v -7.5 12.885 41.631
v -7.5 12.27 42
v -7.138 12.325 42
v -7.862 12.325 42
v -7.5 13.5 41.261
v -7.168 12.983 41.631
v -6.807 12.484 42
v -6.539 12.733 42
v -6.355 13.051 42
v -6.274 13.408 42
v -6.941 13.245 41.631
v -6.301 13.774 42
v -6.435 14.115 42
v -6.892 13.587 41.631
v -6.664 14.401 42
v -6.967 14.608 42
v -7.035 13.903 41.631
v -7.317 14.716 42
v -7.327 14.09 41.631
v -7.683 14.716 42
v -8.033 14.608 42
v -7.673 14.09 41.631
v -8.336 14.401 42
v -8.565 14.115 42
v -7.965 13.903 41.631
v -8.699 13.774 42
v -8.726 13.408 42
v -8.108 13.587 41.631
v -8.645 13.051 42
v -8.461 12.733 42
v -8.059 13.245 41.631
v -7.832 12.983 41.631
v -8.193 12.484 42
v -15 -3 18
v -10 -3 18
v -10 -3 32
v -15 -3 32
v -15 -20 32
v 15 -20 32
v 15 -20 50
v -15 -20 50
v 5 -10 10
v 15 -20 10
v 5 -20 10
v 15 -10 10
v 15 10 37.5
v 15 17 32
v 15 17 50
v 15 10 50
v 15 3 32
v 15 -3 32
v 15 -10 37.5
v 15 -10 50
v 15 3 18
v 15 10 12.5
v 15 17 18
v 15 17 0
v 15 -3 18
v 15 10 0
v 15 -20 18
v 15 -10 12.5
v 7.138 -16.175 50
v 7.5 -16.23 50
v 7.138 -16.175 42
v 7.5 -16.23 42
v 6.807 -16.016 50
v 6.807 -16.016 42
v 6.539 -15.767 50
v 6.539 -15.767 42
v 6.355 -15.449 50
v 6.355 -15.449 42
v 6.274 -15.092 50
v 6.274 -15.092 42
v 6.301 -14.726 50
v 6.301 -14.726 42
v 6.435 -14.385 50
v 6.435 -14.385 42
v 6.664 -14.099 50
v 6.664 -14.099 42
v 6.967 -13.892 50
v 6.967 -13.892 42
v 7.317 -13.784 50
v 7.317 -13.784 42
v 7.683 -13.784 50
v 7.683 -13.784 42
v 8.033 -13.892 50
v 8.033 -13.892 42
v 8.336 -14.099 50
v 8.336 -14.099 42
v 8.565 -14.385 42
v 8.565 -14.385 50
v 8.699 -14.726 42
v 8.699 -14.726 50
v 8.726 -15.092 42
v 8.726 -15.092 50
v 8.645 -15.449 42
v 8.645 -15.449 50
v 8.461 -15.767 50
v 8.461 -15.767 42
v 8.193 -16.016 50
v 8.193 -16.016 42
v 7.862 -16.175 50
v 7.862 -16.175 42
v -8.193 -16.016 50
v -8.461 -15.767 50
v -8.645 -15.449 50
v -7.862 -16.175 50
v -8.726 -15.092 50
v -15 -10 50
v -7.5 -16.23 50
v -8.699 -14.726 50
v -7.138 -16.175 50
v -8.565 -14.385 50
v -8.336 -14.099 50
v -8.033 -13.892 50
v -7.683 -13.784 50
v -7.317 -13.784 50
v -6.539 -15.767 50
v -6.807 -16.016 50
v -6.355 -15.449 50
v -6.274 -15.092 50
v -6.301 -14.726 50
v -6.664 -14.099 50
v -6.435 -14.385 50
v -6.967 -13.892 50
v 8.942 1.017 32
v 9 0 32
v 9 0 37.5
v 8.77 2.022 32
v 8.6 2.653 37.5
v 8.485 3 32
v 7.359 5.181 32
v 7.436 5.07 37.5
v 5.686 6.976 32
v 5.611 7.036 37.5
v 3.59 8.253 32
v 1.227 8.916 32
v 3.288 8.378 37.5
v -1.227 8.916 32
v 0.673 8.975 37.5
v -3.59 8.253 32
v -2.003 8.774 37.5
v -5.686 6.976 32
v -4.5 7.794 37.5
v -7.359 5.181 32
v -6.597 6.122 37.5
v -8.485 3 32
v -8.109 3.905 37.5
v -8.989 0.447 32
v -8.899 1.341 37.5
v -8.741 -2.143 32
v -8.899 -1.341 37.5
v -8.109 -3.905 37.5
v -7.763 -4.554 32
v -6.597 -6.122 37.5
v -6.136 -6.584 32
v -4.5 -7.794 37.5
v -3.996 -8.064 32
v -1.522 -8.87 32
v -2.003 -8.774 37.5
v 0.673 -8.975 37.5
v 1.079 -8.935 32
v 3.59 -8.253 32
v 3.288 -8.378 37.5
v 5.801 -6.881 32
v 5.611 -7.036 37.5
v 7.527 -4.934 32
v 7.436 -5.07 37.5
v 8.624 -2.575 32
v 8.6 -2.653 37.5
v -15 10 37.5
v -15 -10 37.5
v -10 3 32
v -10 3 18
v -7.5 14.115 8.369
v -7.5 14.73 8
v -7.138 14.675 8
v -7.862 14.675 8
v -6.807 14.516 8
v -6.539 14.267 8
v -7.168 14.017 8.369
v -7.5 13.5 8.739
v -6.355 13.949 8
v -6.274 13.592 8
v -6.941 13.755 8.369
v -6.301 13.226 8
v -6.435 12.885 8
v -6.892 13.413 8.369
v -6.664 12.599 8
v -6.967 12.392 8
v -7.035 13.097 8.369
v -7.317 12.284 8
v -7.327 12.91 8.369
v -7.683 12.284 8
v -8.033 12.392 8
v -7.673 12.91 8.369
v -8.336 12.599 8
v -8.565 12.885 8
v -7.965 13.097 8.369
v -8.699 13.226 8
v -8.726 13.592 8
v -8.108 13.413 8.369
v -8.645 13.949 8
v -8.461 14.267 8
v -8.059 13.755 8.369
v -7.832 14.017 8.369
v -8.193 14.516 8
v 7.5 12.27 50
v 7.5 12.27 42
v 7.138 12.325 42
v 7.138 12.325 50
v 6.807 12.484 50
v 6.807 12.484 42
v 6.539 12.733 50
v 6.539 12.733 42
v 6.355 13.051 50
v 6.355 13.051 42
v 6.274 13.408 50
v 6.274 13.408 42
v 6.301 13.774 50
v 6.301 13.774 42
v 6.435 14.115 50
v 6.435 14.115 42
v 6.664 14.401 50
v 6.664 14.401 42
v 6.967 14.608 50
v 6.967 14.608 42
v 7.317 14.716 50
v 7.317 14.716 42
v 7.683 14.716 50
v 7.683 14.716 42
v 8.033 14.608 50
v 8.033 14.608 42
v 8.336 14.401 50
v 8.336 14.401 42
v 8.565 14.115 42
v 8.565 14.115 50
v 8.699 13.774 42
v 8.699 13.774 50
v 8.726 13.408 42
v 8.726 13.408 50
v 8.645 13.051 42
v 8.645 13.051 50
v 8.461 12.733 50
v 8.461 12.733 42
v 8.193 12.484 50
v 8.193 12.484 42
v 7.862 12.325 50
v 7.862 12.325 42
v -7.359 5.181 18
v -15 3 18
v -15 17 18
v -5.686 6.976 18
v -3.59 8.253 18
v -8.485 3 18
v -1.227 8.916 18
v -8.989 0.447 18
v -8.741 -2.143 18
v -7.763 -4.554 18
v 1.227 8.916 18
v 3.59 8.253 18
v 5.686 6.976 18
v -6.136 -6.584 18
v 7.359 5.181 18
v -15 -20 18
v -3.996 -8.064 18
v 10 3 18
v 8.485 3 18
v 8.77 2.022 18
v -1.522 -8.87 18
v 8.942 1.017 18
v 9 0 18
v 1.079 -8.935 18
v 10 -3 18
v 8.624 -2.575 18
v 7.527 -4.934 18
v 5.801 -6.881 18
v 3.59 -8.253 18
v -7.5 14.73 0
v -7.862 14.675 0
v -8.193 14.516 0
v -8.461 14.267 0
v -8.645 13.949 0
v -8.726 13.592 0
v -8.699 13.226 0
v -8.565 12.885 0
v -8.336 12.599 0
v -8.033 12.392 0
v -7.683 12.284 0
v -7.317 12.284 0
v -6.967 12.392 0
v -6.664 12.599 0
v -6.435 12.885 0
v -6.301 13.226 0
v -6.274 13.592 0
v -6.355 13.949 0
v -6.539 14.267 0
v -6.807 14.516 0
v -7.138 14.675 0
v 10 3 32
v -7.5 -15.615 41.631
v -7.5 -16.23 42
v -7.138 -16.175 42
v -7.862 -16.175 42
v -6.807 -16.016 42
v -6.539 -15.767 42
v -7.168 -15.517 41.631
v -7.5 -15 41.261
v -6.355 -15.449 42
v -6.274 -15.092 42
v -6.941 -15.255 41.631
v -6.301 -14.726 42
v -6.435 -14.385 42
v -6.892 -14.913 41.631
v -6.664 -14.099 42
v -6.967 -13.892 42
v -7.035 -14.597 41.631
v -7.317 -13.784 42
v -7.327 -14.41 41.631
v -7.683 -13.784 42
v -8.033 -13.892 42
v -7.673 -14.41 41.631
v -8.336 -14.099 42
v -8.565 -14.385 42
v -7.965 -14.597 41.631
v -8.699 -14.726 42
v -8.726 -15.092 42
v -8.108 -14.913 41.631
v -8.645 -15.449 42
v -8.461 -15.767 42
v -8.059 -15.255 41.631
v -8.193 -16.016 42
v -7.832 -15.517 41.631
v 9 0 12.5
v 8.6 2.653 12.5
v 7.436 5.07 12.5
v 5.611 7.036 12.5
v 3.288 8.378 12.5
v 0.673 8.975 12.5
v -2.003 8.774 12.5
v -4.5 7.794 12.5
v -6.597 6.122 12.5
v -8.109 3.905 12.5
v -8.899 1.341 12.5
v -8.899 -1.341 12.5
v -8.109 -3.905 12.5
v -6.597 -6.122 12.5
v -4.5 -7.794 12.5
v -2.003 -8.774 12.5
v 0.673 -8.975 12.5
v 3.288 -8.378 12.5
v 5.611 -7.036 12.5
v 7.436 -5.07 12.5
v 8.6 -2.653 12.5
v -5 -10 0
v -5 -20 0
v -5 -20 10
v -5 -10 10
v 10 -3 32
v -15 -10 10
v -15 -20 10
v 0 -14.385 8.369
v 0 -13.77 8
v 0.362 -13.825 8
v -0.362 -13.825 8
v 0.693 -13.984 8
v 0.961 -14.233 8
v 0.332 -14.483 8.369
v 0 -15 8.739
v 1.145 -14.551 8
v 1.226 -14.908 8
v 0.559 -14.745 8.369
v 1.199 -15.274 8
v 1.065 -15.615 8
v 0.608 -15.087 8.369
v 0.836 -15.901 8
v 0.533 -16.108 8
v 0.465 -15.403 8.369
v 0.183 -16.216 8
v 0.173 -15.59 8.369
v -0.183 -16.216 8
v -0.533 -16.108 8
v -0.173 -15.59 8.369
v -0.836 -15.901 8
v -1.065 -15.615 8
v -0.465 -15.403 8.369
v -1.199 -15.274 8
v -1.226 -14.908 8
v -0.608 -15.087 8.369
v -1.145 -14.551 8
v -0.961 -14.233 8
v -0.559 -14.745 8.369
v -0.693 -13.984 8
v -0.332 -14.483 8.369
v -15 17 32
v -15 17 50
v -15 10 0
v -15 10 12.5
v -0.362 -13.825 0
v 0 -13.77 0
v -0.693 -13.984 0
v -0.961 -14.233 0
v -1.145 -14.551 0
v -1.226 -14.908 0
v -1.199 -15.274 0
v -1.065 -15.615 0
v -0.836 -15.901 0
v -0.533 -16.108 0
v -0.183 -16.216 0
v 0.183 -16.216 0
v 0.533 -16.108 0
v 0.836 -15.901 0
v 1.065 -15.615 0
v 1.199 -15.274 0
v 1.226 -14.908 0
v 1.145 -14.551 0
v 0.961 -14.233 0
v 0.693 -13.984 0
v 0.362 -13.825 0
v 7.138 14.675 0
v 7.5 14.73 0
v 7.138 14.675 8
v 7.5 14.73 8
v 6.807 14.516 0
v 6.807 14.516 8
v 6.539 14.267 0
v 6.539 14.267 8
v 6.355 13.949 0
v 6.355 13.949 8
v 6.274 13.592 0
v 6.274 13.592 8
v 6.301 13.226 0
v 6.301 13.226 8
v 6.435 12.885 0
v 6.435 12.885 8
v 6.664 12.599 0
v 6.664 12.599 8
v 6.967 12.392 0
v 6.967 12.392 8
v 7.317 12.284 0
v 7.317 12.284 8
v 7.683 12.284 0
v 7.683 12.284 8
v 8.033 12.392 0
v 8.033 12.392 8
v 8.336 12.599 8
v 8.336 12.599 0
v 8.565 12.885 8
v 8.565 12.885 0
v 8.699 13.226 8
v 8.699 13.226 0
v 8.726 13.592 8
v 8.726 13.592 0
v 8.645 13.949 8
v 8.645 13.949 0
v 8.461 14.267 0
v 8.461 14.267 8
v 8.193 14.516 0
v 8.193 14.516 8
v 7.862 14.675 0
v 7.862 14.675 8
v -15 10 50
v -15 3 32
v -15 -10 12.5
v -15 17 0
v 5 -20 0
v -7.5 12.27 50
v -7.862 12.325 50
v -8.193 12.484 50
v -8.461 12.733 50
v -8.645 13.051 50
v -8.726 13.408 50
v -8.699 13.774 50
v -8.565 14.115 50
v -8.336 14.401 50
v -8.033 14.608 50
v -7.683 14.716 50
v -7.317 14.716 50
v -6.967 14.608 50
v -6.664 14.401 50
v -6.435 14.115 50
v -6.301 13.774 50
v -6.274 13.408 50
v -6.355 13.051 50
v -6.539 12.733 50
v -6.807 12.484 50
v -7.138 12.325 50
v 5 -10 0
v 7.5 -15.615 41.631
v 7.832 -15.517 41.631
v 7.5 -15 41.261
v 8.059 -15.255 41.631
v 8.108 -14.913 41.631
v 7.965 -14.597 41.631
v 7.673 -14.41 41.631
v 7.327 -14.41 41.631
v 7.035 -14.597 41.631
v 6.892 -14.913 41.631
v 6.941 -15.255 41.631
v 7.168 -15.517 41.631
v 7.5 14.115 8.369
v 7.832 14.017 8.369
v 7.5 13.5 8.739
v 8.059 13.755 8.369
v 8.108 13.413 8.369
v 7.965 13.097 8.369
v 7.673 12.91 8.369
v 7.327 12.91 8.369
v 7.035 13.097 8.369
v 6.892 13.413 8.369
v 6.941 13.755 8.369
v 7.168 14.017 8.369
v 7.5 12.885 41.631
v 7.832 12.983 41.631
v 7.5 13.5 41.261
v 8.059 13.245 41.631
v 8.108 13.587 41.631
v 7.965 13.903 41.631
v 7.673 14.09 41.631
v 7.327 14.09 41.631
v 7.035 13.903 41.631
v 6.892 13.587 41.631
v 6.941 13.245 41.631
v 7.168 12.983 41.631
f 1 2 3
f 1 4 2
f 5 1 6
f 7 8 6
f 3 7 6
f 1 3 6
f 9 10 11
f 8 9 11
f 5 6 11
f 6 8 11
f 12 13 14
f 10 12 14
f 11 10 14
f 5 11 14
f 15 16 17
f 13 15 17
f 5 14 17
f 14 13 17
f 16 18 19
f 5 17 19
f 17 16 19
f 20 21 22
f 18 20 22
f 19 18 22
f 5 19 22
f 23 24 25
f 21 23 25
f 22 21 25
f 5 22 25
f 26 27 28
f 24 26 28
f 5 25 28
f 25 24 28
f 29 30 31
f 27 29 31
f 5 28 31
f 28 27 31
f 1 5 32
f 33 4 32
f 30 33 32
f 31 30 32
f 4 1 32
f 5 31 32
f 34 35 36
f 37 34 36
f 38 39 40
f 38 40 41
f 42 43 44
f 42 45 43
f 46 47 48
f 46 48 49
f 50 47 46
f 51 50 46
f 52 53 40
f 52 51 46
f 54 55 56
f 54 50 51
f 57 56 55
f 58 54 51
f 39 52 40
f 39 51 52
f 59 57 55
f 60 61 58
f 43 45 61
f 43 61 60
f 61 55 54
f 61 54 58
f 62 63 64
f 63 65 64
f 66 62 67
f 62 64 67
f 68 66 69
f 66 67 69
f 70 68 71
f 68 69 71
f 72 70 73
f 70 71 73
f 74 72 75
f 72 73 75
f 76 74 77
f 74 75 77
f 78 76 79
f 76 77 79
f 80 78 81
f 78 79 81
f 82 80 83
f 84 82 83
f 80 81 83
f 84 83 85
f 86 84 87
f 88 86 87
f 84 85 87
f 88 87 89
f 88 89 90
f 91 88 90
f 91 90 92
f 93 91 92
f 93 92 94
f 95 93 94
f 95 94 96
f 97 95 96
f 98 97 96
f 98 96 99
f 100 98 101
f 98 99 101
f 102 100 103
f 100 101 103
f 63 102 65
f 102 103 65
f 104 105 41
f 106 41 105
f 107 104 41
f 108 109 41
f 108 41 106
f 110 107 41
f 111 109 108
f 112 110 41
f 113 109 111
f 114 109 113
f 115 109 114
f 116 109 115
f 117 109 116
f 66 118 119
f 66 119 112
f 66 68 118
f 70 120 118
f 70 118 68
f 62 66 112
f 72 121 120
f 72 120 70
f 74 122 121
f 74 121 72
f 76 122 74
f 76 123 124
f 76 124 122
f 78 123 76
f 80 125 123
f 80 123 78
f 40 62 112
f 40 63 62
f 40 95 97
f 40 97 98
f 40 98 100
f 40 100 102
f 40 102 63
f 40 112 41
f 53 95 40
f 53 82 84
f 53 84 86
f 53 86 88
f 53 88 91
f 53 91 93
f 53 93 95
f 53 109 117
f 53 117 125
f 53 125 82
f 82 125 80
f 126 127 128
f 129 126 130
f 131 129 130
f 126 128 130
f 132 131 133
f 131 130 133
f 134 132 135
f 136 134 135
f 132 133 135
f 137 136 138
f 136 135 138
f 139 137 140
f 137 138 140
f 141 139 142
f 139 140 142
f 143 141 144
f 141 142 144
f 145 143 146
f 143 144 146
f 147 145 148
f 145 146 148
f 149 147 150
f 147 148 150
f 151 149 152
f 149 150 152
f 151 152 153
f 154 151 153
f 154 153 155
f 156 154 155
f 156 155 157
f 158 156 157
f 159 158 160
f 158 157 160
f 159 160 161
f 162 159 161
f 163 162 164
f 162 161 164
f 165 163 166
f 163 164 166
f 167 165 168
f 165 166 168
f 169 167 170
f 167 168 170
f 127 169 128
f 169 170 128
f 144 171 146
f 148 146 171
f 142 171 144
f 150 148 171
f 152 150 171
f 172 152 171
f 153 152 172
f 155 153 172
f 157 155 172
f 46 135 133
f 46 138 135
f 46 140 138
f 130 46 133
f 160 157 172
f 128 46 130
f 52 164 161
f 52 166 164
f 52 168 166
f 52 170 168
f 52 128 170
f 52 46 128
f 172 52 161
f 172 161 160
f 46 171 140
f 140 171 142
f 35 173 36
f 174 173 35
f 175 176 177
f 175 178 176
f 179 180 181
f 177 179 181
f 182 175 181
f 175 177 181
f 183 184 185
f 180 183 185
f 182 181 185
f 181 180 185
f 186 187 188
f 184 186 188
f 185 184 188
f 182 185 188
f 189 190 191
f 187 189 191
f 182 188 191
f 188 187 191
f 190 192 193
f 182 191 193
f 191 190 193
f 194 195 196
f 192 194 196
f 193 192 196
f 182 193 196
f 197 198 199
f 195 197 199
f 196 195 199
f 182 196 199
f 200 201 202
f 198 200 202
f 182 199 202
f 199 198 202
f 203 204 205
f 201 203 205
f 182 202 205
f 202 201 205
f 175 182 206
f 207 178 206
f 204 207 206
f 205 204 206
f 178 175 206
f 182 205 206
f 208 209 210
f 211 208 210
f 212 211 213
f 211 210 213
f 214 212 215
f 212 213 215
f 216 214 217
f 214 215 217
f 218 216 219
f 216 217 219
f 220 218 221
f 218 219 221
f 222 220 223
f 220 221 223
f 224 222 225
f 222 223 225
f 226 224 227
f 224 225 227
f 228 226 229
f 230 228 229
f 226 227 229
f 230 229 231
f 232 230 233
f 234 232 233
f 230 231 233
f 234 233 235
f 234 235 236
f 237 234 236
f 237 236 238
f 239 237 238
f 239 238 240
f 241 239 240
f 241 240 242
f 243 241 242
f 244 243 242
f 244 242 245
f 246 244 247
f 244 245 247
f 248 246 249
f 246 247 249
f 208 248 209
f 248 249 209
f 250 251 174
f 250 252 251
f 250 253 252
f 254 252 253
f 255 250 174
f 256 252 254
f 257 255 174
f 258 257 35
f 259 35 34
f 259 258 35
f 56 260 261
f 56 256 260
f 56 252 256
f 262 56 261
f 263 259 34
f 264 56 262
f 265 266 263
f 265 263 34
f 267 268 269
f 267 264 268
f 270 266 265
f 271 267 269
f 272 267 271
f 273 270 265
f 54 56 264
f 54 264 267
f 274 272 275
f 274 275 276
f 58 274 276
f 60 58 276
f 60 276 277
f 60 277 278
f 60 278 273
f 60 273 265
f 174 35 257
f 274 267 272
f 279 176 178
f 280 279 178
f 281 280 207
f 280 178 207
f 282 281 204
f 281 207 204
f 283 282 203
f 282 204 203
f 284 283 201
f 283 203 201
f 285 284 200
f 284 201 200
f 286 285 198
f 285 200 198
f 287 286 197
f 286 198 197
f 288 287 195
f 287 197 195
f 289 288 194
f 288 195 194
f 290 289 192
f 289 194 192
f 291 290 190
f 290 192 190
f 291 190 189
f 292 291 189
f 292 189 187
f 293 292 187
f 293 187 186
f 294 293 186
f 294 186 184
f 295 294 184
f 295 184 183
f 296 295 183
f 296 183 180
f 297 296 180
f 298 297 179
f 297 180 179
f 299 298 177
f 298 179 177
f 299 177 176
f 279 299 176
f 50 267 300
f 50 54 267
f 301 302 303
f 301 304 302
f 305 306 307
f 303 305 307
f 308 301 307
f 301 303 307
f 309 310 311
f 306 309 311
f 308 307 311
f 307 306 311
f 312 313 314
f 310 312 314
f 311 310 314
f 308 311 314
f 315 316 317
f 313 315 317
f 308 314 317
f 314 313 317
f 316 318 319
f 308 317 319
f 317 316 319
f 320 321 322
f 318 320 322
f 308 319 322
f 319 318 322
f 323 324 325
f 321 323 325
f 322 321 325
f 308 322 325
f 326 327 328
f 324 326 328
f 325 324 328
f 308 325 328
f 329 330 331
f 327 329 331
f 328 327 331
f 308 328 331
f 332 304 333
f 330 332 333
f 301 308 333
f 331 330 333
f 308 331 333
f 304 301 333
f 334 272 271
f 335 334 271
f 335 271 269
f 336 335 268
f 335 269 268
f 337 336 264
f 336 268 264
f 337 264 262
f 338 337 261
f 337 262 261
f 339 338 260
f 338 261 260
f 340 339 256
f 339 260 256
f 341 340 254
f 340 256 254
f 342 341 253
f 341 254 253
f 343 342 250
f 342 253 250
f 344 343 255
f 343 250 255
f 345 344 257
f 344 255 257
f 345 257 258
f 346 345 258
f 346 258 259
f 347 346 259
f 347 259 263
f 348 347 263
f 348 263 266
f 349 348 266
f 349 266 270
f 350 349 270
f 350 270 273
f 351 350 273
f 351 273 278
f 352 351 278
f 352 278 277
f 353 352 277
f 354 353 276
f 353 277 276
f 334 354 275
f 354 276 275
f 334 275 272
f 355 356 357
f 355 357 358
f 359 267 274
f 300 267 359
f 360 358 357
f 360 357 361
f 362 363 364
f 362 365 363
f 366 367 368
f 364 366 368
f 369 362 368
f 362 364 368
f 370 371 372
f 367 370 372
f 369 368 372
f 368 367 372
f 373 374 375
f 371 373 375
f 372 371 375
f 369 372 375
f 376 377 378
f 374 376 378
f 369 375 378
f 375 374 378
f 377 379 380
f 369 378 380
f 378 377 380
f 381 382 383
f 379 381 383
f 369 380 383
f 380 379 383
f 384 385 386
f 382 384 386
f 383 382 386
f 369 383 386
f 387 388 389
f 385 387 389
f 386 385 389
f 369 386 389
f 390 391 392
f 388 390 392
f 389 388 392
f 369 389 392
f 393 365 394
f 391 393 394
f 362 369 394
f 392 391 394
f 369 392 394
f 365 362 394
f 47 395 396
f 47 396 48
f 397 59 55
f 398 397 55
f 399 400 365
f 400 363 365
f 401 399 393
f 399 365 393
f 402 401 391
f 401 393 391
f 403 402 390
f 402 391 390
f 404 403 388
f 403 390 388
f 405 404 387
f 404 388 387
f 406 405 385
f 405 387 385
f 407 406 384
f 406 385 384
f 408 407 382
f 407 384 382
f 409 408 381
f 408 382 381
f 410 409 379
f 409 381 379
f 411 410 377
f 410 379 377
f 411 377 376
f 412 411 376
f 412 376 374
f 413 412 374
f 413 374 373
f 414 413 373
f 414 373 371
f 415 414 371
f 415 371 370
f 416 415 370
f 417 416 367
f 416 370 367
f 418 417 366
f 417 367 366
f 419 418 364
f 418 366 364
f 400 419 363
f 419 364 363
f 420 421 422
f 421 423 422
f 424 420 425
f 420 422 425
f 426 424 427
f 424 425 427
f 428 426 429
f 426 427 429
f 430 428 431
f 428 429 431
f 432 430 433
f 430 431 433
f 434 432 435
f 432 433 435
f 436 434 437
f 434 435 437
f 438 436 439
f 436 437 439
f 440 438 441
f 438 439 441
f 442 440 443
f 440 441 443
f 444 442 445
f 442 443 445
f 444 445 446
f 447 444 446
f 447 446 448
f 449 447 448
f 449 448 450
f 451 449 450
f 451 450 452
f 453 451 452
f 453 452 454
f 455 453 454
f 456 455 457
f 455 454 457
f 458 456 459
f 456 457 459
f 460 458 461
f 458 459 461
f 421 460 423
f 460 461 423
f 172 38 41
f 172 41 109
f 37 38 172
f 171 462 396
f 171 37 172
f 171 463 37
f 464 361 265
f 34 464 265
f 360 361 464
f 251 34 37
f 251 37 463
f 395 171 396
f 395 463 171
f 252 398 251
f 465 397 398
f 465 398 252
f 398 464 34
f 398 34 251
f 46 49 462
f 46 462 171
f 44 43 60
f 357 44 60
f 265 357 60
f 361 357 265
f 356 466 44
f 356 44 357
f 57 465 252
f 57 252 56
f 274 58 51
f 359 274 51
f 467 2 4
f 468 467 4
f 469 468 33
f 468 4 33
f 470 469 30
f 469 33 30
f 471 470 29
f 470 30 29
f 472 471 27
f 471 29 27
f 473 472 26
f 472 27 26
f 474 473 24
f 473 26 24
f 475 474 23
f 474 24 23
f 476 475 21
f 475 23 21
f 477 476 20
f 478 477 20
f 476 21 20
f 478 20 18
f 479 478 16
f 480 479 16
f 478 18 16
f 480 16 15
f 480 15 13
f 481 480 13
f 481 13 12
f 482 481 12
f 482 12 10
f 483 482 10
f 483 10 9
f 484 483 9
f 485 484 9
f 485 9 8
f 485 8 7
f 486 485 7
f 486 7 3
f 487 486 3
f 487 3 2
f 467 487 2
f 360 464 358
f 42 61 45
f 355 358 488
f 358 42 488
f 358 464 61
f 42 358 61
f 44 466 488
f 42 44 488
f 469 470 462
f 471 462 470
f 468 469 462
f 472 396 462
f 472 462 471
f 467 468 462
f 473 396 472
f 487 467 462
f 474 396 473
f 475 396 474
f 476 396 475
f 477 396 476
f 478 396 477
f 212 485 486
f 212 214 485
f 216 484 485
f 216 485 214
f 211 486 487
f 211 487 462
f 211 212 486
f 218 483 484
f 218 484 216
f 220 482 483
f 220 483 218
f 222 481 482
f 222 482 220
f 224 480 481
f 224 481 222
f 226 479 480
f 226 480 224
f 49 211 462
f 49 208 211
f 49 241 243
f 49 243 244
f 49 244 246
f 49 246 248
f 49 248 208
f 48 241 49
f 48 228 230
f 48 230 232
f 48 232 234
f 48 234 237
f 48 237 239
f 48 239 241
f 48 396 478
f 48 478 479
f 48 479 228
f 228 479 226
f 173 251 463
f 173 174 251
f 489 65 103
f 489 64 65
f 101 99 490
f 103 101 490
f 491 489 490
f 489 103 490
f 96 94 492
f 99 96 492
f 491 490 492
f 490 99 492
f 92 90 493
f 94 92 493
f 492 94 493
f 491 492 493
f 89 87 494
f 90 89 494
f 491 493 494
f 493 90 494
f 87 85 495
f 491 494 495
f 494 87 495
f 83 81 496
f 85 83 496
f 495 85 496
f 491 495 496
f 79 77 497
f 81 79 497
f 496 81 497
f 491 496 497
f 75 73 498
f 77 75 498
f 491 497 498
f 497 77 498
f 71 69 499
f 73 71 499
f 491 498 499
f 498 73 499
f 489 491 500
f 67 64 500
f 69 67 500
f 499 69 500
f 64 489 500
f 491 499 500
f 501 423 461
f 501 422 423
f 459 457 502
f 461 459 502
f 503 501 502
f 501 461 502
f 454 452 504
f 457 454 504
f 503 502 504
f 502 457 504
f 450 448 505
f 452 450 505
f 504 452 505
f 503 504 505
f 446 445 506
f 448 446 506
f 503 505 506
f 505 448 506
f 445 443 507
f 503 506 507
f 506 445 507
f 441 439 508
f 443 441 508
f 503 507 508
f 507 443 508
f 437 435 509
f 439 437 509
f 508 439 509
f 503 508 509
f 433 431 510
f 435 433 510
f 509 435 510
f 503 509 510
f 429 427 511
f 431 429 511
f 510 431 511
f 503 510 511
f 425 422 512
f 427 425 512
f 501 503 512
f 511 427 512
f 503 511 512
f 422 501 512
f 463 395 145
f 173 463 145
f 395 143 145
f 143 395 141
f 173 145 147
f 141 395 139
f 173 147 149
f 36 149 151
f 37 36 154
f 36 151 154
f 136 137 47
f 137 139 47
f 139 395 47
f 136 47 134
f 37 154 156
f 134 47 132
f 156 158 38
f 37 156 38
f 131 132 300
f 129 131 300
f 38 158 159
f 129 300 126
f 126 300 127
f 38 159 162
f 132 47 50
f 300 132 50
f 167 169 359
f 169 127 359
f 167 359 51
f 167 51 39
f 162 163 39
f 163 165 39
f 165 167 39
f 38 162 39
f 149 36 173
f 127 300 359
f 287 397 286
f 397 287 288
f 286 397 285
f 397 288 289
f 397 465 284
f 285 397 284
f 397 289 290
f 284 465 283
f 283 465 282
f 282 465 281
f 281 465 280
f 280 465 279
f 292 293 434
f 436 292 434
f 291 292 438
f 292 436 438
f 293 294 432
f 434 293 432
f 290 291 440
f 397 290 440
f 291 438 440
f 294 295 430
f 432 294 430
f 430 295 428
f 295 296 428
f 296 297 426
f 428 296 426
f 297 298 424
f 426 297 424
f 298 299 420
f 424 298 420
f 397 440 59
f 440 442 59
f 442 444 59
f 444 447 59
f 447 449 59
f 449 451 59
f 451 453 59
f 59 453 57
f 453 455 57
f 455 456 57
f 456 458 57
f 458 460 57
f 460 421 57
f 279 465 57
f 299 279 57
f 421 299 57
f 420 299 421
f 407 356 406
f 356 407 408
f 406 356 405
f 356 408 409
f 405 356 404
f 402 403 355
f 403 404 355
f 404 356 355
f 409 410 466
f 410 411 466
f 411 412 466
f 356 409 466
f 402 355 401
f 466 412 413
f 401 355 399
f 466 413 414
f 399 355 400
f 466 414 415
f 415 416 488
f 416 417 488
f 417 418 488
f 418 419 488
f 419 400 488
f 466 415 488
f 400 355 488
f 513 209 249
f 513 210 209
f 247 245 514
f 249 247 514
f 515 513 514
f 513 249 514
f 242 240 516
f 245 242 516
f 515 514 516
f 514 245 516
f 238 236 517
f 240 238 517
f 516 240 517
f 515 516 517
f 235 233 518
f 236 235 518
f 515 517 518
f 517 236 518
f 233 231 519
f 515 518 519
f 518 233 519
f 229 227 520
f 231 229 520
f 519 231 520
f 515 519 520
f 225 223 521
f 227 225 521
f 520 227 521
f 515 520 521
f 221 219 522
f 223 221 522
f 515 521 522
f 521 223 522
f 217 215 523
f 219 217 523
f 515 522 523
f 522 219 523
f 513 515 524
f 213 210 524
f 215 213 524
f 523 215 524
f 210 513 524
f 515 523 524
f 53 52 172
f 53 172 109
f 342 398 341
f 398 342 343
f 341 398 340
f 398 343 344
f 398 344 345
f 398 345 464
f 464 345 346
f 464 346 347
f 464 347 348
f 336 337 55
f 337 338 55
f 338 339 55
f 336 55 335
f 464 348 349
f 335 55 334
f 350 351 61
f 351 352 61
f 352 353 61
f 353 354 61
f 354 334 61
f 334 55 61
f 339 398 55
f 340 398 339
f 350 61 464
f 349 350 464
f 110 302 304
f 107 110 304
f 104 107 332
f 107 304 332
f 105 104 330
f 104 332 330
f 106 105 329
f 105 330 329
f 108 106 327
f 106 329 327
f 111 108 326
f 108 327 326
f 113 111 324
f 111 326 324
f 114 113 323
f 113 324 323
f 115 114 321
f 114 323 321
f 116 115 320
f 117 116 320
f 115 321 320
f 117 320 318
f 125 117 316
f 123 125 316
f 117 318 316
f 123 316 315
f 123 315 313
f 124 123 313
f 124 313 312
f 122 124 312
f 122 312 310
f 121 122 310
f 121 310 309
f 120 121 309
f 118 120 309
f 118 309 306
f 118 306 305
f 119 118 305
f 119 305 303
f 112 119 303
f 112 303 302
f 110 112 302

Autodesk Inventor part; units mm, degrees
ref_plane "YZ Plane" through (0, 0, 0) normal (1, 0, 0) x (0, 1, 0)
ref_plane "XZ Plane" through (0, 0, 0) normal (0, 1, 0) x (-1, 0, 0)
ref_plane "XY Plane" through (0, 0, 0) normal (0, 0, 1) x (1, 0, 0)
sketch "Sketch1" plane through (0, 0, 0) normal (0, 0, 1) x (1, 0, 0)
  line L0 (-15, 17) -> (15, 17)
  line L1 (15, 17) -> (15, -20)
  line L2 (15, -20) -> (-15, -20)
  line L3 (-15, -20) -> (-15, 17)
  point P0 (0, 0)
  dimension "d0" = 37
  dimension "d1" = 30
  dimension "d2" = 15
  dimension "d3" = 20
extrude "Extrusion1" add sketch "Sketch1" along normal blind 50
sketch "Sketch2" plane through (0, 0, 50) normal (0, 0, 1) x (1, 0, 0)
  circle A0 centre (0, 0) radius 9
  dimension "d6" = 18
extrude "Extrusion2" cut sketch "Sketch2" against normal through all
sketch "Sketch3" plane through (15, -20, 0) normal (1, 0, 0) x (0, 0, -1)
  line L0 (-50, 30) -> (-37.5, 30)
  line L1 (-37.5, 30) -> (-37.5, 10)
  line L2 (-37.5, 10) -> (-50, 10)
  line L3 (-50, 10) -> (-50, 30)
  line L4 (0, 0) -> (0, 37) projected
  line L5 (0, 30) -> (-12.5, 30)
  line L6 (-12.5, 30) -> (-12.5, 10)
  line L7 (-12.5, 10) -> (0, 10)
  line L8 (0, 10) -> (0, 30)
  line L9 (0, 0) -> (-50, 0) projected
  line L10 (0, 37) -> (-50, 37) projected
  line L11 (-50, 0) -> (-50, 37) projected
  point P0 (0, 20)
  dimension "d9" = 10
  dimension "d10" = 7
  dimension "d11" = 10
  dimension "d12" = 0
  dimension "d13" = 12.5
  dimension "d14" = 12.5
extrude "Extrusion3" cut sketch "Sketch3" against normal through all contours L0 L1 L2 L3 | L4 L7 L6 L5
sketch "Sketch4" plane through (15, -20, 50) normal (1, 0, 0) x (0, 0, -1)
  line L0 (18, 37) -> (32, 37)
  line L1 (32, 37) -> (32, 23)
  line L2 (32, 23) -> (18, 23)
  line L3 (18, 23) -> (18, 37)
  line L4 (18, 0) -> (32, 0)
  line L5 (32, 0) -> (32, 17)
  line L6 (32, 17) -> (18, 17)
  line L7 (18, 17) -> (18, 0)
  line L8 (50, 37) -> (0, 37) projected
  line L9 (50, 0) -> (0, 0) projected
  line L10 (0, 30) -> (0, 37) projected
  point P0 (50, 20)
  dimension "d17" = 14
  dimension "d18" = 0
  dimension "d19" = 0
  dimension "d20" = 18
  dimension "d21" = 17
  dimension "d22" = 14
extrude "Extrusion4" cut sketch "Sketch4" against normal through all
sketch "Sketch5" plane through (0, 0, 0) normal (0, 0, -1) x (-1, 0, 0)
  line L0 (-15, -20) -> (15, -20) projected
  line L1 (-15, -20) -> (-5, -20)
  line L2 (-5, -20) -> (-5, -10)
  line L3 (-5, -10) -> (-15, -10)
  line L4 (-15, -10) -> (-15, -20)
  line L5 (15, -20) -> (5, -20)
  line L6 (5, -20) -> (5, -10)
  line L7 (5, -10) -> (15, -10)
  line L8 (15, -10) -> (15, -20)
  line L9 (15, -10) -> (-15, -10) projected
  point P0 (0, 0)
  dimension "d27" = 10
  dimension "d28" = 10
  dimension "d31" = 0
  dimension "d32" = 0
extrude "Extrusion5" cut sketch "Sketch5" against normal blind 10 contours L4 L3 L2 L0 | L6 L7 L8 L0
sketch "Sketch6" plane through (0, 0, 50) normal (0, 0, 1) x (1, 0, 0)
  line L0 (15, 17) -> (-15, 17) projected
  line L1 (-15, 17) -> (-15, 10) projected
  line L2 (-15, -10) -> (-15, -20) projected
  line L3 (-15, -20) -> (15, -20) projected
  point P0 (0, 0)
  point P1 (-7.5, 13.5)
  point P2 (7.5, 13.5)
  point P3 (-7.5, -15)
  point P4 (7.5, -15)
  dimension "d33" = 3.5
  dimension "d34" = 3.5
  dimension "d35" = 15
  dimension "d36" = 7.5
  dimension "d37" = 7.5
  dimension "d38" = 15
  dimension "d39" = 5
  dimension "d40" = 5
hole "Hole1" at (-7.5, 13.5, 50) at (7.5, 13.5, 50) at (-7.5, -15, 50) at (7.5, -15, 50) direction (0, 0, -1) diameter 2.459 depth 8 tip angle 118 thread size "M3x0.5" class "6H" standard "ANSI Metric M Profile"
sketch "Sketch7" plane through (0, 0, 0) normal (0, 0, -1) x (-1, 0, 0)
  circle A0 centre (-7.5, 13.5) radius 1.2295 projected
  circle A1 centre (7.5, 13.5) radius 1.2295 projected
  point P0 (0, 0)
  point P1 (0, -15)
  dimension "d49" = 15
  dimension "d50" = 0
hole "Hole2" at (7.5, 13.5, 0) at (-7.5, 13.5, 0) at (0, -15, 0) direction (0, 0, 1) diameter 2.459 depth 8 tip angle 118 thread size "M3x0.5" class "6H" standard "ANSI Metric M Profile"
sketch "Sketch8" plane through (-15, 3, 18) normal (0, 1, 0) x (1, 0, 0)
  line L0 (30, -14) -> (23.4853, -14) projected
  line L1 (5, 0) -> (25, 0)
  line L2 (25, 0) -> (25, -14)
  line L3 (25, -14) -> (5, -14)
  line L4 (5, -14) -> (5, 0)
  line L5 (0, 0) -> (30, 0) projected
  line L6 (23.4853, -14) -> (23.4853, 0) projected
  line L7 (6.5147, 0) -> (6.5147, -14) projected
  line L8 (30, 0) -> (30, -14) projected
  line L9 (0, -14) -> (0, 0) projected
  point P0 (15, 18)
  dimension "d58" = 0
  dimension "d63" = 5
  dimension "d64" = 5
extrude "Extrusion6" cut sketch "Sketch8" against normal through all contours L0 L6 L1 L2 | L3 L4 L1 L7
properties part number "RotationShell"
